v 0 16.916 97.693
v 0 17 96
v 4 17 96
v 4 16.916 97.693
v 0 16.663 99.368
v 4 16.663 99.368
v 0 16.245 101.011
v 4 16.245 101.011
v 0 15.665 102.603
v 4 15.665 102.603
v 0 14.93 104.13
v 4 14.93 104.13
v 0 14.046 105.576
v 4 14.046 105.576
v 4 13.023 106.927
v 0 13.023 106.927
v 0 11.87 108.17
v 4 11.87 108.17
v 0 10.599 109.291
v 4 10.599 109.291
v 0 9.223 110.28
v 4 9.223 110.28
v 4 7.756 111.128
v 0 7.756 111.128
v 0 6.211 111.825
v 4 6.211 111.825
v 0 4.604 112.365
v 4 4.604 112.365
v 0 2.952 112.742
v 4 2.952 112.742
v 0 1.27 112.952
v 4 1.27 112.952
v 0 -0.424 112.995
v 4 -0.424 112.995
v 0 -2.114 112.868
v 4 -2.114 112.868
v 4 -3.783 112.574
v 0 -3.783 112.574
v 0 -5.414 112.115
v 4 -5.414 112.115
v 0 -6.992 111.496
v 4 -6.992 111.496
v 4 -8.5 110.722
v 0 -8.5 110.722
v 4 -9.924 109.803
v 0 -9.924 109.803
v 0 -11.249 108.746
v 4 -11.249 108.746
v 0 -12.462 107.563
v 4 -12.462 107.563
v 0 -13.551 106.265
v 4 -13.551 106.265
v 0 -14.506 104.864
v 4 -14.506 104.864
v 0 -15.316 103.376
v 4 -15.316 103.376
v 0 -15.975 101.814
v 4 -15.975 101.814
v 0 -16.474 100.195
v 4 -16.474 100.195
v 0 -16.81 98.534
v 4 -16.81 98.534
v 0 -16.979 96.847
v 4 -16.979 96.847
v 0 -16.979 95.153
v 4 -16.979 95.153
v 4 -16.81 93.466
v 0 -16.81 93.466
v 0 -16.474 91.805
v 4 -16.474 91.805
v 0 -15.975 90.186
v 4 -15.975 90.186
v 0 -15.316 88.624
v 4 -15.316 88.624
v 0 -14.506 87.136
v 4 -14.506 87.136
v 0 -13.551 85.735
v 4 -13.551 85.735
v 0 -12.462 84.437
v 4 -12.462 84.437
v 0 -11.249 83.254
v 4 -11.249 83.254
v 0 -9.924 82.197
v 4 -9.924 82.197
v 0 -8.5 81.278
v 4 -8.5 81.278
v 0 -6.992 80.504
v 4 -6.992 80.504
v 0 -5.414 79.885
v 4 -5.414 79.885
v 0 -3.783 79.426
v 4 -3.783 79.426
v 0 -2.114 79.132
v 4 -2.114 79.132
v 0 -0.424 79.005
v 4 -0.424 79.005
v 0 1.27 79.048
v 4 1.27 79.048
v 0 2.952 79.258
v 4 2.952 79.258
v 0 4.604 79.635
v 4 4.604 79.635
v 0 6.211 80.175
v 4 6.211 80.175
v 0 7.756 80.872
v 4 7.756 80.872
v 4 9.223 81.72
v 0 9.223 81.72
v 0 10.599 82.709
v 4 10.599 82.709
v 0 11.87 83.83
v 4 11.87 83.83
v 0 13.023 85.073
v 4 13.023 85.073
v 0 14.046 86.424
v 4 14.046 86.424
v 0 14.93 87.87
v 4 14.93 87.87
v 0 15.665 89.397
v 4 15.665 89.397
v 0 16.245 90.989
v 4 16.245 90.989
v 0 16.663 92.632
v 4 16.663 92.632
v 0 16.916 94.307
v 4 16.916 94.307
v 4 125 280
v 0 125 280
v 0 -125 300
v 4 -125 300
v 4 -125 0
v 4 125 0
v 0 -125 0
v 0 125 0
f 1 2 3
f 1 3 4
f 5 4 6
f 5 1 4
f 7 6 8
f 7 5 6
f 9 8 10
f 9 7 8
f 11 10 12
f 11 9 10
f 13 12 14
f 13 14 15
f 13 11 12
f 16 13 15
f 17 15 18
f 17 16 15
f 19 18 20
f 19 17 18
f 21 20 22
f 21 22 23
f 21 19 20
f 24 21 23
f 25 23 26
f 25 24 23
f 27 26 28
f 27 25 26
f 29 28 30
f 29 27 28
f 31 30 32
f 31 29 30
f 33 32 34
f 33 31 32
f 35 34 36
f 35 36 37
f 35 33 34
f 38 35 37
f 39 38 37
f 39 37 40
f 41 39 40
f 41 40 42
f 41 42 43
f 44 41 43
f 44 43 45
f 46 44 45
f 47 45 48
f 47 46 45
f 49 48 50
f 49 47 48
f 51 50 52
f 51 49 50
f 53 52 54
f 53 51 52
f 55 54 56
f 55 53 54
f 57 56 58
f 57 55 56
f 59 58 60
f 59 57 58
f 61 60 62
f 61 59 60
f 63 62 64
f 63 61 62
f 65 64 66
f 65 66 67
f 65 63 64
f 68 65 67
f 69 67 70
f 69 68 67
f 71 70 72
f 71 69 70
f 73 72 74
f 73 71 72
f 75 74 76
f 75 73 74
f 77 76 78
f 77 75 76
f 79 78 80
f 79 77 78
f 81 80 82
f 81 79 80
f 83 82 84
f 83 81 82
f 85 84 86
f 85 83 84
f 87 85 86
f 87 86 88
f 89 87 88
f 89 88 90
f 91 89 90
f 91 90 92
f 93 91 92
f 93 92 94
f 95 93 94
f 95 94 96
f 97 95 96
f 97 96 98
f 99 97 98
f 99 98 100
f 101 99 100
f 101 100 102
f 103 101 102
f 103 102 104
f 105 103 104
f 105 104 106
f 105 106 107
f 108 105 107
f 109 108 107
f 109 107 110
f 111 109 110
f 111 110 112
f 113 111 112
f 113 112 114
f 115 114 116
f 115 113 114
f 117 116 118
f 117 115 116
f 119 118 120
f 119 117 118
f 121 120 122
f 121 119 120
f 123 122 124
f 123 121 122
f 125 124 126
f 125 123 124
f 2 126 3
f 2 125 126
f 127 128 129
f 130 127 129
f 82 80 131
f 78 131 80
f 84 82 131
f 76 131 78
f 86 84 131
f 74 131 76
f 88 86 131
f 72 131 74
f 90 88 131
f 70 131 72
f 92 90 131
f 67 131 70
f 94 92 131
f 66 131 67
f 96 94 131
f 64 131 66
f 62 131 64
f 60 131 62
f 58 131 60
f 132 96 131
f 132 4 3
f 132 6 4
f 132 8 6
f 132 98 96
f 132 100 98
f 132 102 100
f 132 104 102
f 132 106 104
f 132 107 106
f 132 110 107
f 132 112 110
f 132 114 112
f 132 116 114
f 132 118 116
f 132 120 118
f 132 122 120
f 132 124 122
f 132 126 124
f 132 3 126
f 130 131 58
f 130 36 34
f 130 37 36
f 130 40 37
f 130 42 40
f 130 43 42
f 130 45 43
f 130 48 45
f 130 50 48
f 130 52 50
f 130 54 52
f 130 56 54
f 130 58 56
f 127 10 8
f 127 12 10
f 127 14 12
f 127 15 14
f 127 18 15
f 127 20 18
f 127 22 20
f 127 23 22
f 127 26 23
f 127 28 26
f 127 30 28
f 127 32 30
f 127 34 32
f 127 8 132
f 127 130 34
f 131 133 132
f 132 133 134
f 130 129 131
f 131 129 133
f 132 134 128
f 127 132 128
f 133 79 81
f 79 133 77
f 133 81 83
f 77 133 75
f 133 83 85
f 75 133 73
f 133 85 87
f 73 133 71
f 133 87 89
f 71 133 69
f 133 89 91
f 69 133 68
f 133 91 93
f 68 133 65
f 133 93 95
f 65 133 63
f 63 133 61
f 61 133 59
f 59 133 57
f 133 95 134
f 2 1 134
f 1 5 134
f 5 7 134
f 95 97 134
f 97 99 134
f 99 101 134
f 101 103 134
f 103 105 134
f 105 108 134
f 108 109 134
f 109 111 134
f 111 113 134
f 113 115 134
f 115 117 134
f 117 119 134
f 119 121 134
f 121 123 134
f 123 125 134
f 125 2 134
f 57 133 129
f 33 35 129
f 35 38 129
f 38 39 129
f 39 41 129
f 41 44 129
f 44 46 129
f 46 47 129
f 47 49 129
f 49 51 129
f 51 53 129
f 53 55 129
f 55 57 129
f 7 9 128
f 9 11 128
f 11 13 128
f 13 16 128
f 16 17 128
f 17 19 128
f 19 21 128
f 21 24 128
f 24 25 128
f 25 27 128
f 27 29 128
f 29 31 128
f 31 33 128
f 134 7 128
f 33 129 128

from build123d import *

# Parameters (mm, degrees)
F0_R     = 17
F1_DEPTH = 4


with BuildPart() as f1:
    # F0 (on Right) → F1 (new body)
    with BuildSketch(Plane.YZ):
        Polygon((-125, 300), (-125, 0), (125, 0), (125, 280), align=None)
        with Locations((0, 96)):
            Circle(F0_R, mode=Mode.SUBTRACT)
    extrude(amount=F1_DEPTH)


solid = f1.part
